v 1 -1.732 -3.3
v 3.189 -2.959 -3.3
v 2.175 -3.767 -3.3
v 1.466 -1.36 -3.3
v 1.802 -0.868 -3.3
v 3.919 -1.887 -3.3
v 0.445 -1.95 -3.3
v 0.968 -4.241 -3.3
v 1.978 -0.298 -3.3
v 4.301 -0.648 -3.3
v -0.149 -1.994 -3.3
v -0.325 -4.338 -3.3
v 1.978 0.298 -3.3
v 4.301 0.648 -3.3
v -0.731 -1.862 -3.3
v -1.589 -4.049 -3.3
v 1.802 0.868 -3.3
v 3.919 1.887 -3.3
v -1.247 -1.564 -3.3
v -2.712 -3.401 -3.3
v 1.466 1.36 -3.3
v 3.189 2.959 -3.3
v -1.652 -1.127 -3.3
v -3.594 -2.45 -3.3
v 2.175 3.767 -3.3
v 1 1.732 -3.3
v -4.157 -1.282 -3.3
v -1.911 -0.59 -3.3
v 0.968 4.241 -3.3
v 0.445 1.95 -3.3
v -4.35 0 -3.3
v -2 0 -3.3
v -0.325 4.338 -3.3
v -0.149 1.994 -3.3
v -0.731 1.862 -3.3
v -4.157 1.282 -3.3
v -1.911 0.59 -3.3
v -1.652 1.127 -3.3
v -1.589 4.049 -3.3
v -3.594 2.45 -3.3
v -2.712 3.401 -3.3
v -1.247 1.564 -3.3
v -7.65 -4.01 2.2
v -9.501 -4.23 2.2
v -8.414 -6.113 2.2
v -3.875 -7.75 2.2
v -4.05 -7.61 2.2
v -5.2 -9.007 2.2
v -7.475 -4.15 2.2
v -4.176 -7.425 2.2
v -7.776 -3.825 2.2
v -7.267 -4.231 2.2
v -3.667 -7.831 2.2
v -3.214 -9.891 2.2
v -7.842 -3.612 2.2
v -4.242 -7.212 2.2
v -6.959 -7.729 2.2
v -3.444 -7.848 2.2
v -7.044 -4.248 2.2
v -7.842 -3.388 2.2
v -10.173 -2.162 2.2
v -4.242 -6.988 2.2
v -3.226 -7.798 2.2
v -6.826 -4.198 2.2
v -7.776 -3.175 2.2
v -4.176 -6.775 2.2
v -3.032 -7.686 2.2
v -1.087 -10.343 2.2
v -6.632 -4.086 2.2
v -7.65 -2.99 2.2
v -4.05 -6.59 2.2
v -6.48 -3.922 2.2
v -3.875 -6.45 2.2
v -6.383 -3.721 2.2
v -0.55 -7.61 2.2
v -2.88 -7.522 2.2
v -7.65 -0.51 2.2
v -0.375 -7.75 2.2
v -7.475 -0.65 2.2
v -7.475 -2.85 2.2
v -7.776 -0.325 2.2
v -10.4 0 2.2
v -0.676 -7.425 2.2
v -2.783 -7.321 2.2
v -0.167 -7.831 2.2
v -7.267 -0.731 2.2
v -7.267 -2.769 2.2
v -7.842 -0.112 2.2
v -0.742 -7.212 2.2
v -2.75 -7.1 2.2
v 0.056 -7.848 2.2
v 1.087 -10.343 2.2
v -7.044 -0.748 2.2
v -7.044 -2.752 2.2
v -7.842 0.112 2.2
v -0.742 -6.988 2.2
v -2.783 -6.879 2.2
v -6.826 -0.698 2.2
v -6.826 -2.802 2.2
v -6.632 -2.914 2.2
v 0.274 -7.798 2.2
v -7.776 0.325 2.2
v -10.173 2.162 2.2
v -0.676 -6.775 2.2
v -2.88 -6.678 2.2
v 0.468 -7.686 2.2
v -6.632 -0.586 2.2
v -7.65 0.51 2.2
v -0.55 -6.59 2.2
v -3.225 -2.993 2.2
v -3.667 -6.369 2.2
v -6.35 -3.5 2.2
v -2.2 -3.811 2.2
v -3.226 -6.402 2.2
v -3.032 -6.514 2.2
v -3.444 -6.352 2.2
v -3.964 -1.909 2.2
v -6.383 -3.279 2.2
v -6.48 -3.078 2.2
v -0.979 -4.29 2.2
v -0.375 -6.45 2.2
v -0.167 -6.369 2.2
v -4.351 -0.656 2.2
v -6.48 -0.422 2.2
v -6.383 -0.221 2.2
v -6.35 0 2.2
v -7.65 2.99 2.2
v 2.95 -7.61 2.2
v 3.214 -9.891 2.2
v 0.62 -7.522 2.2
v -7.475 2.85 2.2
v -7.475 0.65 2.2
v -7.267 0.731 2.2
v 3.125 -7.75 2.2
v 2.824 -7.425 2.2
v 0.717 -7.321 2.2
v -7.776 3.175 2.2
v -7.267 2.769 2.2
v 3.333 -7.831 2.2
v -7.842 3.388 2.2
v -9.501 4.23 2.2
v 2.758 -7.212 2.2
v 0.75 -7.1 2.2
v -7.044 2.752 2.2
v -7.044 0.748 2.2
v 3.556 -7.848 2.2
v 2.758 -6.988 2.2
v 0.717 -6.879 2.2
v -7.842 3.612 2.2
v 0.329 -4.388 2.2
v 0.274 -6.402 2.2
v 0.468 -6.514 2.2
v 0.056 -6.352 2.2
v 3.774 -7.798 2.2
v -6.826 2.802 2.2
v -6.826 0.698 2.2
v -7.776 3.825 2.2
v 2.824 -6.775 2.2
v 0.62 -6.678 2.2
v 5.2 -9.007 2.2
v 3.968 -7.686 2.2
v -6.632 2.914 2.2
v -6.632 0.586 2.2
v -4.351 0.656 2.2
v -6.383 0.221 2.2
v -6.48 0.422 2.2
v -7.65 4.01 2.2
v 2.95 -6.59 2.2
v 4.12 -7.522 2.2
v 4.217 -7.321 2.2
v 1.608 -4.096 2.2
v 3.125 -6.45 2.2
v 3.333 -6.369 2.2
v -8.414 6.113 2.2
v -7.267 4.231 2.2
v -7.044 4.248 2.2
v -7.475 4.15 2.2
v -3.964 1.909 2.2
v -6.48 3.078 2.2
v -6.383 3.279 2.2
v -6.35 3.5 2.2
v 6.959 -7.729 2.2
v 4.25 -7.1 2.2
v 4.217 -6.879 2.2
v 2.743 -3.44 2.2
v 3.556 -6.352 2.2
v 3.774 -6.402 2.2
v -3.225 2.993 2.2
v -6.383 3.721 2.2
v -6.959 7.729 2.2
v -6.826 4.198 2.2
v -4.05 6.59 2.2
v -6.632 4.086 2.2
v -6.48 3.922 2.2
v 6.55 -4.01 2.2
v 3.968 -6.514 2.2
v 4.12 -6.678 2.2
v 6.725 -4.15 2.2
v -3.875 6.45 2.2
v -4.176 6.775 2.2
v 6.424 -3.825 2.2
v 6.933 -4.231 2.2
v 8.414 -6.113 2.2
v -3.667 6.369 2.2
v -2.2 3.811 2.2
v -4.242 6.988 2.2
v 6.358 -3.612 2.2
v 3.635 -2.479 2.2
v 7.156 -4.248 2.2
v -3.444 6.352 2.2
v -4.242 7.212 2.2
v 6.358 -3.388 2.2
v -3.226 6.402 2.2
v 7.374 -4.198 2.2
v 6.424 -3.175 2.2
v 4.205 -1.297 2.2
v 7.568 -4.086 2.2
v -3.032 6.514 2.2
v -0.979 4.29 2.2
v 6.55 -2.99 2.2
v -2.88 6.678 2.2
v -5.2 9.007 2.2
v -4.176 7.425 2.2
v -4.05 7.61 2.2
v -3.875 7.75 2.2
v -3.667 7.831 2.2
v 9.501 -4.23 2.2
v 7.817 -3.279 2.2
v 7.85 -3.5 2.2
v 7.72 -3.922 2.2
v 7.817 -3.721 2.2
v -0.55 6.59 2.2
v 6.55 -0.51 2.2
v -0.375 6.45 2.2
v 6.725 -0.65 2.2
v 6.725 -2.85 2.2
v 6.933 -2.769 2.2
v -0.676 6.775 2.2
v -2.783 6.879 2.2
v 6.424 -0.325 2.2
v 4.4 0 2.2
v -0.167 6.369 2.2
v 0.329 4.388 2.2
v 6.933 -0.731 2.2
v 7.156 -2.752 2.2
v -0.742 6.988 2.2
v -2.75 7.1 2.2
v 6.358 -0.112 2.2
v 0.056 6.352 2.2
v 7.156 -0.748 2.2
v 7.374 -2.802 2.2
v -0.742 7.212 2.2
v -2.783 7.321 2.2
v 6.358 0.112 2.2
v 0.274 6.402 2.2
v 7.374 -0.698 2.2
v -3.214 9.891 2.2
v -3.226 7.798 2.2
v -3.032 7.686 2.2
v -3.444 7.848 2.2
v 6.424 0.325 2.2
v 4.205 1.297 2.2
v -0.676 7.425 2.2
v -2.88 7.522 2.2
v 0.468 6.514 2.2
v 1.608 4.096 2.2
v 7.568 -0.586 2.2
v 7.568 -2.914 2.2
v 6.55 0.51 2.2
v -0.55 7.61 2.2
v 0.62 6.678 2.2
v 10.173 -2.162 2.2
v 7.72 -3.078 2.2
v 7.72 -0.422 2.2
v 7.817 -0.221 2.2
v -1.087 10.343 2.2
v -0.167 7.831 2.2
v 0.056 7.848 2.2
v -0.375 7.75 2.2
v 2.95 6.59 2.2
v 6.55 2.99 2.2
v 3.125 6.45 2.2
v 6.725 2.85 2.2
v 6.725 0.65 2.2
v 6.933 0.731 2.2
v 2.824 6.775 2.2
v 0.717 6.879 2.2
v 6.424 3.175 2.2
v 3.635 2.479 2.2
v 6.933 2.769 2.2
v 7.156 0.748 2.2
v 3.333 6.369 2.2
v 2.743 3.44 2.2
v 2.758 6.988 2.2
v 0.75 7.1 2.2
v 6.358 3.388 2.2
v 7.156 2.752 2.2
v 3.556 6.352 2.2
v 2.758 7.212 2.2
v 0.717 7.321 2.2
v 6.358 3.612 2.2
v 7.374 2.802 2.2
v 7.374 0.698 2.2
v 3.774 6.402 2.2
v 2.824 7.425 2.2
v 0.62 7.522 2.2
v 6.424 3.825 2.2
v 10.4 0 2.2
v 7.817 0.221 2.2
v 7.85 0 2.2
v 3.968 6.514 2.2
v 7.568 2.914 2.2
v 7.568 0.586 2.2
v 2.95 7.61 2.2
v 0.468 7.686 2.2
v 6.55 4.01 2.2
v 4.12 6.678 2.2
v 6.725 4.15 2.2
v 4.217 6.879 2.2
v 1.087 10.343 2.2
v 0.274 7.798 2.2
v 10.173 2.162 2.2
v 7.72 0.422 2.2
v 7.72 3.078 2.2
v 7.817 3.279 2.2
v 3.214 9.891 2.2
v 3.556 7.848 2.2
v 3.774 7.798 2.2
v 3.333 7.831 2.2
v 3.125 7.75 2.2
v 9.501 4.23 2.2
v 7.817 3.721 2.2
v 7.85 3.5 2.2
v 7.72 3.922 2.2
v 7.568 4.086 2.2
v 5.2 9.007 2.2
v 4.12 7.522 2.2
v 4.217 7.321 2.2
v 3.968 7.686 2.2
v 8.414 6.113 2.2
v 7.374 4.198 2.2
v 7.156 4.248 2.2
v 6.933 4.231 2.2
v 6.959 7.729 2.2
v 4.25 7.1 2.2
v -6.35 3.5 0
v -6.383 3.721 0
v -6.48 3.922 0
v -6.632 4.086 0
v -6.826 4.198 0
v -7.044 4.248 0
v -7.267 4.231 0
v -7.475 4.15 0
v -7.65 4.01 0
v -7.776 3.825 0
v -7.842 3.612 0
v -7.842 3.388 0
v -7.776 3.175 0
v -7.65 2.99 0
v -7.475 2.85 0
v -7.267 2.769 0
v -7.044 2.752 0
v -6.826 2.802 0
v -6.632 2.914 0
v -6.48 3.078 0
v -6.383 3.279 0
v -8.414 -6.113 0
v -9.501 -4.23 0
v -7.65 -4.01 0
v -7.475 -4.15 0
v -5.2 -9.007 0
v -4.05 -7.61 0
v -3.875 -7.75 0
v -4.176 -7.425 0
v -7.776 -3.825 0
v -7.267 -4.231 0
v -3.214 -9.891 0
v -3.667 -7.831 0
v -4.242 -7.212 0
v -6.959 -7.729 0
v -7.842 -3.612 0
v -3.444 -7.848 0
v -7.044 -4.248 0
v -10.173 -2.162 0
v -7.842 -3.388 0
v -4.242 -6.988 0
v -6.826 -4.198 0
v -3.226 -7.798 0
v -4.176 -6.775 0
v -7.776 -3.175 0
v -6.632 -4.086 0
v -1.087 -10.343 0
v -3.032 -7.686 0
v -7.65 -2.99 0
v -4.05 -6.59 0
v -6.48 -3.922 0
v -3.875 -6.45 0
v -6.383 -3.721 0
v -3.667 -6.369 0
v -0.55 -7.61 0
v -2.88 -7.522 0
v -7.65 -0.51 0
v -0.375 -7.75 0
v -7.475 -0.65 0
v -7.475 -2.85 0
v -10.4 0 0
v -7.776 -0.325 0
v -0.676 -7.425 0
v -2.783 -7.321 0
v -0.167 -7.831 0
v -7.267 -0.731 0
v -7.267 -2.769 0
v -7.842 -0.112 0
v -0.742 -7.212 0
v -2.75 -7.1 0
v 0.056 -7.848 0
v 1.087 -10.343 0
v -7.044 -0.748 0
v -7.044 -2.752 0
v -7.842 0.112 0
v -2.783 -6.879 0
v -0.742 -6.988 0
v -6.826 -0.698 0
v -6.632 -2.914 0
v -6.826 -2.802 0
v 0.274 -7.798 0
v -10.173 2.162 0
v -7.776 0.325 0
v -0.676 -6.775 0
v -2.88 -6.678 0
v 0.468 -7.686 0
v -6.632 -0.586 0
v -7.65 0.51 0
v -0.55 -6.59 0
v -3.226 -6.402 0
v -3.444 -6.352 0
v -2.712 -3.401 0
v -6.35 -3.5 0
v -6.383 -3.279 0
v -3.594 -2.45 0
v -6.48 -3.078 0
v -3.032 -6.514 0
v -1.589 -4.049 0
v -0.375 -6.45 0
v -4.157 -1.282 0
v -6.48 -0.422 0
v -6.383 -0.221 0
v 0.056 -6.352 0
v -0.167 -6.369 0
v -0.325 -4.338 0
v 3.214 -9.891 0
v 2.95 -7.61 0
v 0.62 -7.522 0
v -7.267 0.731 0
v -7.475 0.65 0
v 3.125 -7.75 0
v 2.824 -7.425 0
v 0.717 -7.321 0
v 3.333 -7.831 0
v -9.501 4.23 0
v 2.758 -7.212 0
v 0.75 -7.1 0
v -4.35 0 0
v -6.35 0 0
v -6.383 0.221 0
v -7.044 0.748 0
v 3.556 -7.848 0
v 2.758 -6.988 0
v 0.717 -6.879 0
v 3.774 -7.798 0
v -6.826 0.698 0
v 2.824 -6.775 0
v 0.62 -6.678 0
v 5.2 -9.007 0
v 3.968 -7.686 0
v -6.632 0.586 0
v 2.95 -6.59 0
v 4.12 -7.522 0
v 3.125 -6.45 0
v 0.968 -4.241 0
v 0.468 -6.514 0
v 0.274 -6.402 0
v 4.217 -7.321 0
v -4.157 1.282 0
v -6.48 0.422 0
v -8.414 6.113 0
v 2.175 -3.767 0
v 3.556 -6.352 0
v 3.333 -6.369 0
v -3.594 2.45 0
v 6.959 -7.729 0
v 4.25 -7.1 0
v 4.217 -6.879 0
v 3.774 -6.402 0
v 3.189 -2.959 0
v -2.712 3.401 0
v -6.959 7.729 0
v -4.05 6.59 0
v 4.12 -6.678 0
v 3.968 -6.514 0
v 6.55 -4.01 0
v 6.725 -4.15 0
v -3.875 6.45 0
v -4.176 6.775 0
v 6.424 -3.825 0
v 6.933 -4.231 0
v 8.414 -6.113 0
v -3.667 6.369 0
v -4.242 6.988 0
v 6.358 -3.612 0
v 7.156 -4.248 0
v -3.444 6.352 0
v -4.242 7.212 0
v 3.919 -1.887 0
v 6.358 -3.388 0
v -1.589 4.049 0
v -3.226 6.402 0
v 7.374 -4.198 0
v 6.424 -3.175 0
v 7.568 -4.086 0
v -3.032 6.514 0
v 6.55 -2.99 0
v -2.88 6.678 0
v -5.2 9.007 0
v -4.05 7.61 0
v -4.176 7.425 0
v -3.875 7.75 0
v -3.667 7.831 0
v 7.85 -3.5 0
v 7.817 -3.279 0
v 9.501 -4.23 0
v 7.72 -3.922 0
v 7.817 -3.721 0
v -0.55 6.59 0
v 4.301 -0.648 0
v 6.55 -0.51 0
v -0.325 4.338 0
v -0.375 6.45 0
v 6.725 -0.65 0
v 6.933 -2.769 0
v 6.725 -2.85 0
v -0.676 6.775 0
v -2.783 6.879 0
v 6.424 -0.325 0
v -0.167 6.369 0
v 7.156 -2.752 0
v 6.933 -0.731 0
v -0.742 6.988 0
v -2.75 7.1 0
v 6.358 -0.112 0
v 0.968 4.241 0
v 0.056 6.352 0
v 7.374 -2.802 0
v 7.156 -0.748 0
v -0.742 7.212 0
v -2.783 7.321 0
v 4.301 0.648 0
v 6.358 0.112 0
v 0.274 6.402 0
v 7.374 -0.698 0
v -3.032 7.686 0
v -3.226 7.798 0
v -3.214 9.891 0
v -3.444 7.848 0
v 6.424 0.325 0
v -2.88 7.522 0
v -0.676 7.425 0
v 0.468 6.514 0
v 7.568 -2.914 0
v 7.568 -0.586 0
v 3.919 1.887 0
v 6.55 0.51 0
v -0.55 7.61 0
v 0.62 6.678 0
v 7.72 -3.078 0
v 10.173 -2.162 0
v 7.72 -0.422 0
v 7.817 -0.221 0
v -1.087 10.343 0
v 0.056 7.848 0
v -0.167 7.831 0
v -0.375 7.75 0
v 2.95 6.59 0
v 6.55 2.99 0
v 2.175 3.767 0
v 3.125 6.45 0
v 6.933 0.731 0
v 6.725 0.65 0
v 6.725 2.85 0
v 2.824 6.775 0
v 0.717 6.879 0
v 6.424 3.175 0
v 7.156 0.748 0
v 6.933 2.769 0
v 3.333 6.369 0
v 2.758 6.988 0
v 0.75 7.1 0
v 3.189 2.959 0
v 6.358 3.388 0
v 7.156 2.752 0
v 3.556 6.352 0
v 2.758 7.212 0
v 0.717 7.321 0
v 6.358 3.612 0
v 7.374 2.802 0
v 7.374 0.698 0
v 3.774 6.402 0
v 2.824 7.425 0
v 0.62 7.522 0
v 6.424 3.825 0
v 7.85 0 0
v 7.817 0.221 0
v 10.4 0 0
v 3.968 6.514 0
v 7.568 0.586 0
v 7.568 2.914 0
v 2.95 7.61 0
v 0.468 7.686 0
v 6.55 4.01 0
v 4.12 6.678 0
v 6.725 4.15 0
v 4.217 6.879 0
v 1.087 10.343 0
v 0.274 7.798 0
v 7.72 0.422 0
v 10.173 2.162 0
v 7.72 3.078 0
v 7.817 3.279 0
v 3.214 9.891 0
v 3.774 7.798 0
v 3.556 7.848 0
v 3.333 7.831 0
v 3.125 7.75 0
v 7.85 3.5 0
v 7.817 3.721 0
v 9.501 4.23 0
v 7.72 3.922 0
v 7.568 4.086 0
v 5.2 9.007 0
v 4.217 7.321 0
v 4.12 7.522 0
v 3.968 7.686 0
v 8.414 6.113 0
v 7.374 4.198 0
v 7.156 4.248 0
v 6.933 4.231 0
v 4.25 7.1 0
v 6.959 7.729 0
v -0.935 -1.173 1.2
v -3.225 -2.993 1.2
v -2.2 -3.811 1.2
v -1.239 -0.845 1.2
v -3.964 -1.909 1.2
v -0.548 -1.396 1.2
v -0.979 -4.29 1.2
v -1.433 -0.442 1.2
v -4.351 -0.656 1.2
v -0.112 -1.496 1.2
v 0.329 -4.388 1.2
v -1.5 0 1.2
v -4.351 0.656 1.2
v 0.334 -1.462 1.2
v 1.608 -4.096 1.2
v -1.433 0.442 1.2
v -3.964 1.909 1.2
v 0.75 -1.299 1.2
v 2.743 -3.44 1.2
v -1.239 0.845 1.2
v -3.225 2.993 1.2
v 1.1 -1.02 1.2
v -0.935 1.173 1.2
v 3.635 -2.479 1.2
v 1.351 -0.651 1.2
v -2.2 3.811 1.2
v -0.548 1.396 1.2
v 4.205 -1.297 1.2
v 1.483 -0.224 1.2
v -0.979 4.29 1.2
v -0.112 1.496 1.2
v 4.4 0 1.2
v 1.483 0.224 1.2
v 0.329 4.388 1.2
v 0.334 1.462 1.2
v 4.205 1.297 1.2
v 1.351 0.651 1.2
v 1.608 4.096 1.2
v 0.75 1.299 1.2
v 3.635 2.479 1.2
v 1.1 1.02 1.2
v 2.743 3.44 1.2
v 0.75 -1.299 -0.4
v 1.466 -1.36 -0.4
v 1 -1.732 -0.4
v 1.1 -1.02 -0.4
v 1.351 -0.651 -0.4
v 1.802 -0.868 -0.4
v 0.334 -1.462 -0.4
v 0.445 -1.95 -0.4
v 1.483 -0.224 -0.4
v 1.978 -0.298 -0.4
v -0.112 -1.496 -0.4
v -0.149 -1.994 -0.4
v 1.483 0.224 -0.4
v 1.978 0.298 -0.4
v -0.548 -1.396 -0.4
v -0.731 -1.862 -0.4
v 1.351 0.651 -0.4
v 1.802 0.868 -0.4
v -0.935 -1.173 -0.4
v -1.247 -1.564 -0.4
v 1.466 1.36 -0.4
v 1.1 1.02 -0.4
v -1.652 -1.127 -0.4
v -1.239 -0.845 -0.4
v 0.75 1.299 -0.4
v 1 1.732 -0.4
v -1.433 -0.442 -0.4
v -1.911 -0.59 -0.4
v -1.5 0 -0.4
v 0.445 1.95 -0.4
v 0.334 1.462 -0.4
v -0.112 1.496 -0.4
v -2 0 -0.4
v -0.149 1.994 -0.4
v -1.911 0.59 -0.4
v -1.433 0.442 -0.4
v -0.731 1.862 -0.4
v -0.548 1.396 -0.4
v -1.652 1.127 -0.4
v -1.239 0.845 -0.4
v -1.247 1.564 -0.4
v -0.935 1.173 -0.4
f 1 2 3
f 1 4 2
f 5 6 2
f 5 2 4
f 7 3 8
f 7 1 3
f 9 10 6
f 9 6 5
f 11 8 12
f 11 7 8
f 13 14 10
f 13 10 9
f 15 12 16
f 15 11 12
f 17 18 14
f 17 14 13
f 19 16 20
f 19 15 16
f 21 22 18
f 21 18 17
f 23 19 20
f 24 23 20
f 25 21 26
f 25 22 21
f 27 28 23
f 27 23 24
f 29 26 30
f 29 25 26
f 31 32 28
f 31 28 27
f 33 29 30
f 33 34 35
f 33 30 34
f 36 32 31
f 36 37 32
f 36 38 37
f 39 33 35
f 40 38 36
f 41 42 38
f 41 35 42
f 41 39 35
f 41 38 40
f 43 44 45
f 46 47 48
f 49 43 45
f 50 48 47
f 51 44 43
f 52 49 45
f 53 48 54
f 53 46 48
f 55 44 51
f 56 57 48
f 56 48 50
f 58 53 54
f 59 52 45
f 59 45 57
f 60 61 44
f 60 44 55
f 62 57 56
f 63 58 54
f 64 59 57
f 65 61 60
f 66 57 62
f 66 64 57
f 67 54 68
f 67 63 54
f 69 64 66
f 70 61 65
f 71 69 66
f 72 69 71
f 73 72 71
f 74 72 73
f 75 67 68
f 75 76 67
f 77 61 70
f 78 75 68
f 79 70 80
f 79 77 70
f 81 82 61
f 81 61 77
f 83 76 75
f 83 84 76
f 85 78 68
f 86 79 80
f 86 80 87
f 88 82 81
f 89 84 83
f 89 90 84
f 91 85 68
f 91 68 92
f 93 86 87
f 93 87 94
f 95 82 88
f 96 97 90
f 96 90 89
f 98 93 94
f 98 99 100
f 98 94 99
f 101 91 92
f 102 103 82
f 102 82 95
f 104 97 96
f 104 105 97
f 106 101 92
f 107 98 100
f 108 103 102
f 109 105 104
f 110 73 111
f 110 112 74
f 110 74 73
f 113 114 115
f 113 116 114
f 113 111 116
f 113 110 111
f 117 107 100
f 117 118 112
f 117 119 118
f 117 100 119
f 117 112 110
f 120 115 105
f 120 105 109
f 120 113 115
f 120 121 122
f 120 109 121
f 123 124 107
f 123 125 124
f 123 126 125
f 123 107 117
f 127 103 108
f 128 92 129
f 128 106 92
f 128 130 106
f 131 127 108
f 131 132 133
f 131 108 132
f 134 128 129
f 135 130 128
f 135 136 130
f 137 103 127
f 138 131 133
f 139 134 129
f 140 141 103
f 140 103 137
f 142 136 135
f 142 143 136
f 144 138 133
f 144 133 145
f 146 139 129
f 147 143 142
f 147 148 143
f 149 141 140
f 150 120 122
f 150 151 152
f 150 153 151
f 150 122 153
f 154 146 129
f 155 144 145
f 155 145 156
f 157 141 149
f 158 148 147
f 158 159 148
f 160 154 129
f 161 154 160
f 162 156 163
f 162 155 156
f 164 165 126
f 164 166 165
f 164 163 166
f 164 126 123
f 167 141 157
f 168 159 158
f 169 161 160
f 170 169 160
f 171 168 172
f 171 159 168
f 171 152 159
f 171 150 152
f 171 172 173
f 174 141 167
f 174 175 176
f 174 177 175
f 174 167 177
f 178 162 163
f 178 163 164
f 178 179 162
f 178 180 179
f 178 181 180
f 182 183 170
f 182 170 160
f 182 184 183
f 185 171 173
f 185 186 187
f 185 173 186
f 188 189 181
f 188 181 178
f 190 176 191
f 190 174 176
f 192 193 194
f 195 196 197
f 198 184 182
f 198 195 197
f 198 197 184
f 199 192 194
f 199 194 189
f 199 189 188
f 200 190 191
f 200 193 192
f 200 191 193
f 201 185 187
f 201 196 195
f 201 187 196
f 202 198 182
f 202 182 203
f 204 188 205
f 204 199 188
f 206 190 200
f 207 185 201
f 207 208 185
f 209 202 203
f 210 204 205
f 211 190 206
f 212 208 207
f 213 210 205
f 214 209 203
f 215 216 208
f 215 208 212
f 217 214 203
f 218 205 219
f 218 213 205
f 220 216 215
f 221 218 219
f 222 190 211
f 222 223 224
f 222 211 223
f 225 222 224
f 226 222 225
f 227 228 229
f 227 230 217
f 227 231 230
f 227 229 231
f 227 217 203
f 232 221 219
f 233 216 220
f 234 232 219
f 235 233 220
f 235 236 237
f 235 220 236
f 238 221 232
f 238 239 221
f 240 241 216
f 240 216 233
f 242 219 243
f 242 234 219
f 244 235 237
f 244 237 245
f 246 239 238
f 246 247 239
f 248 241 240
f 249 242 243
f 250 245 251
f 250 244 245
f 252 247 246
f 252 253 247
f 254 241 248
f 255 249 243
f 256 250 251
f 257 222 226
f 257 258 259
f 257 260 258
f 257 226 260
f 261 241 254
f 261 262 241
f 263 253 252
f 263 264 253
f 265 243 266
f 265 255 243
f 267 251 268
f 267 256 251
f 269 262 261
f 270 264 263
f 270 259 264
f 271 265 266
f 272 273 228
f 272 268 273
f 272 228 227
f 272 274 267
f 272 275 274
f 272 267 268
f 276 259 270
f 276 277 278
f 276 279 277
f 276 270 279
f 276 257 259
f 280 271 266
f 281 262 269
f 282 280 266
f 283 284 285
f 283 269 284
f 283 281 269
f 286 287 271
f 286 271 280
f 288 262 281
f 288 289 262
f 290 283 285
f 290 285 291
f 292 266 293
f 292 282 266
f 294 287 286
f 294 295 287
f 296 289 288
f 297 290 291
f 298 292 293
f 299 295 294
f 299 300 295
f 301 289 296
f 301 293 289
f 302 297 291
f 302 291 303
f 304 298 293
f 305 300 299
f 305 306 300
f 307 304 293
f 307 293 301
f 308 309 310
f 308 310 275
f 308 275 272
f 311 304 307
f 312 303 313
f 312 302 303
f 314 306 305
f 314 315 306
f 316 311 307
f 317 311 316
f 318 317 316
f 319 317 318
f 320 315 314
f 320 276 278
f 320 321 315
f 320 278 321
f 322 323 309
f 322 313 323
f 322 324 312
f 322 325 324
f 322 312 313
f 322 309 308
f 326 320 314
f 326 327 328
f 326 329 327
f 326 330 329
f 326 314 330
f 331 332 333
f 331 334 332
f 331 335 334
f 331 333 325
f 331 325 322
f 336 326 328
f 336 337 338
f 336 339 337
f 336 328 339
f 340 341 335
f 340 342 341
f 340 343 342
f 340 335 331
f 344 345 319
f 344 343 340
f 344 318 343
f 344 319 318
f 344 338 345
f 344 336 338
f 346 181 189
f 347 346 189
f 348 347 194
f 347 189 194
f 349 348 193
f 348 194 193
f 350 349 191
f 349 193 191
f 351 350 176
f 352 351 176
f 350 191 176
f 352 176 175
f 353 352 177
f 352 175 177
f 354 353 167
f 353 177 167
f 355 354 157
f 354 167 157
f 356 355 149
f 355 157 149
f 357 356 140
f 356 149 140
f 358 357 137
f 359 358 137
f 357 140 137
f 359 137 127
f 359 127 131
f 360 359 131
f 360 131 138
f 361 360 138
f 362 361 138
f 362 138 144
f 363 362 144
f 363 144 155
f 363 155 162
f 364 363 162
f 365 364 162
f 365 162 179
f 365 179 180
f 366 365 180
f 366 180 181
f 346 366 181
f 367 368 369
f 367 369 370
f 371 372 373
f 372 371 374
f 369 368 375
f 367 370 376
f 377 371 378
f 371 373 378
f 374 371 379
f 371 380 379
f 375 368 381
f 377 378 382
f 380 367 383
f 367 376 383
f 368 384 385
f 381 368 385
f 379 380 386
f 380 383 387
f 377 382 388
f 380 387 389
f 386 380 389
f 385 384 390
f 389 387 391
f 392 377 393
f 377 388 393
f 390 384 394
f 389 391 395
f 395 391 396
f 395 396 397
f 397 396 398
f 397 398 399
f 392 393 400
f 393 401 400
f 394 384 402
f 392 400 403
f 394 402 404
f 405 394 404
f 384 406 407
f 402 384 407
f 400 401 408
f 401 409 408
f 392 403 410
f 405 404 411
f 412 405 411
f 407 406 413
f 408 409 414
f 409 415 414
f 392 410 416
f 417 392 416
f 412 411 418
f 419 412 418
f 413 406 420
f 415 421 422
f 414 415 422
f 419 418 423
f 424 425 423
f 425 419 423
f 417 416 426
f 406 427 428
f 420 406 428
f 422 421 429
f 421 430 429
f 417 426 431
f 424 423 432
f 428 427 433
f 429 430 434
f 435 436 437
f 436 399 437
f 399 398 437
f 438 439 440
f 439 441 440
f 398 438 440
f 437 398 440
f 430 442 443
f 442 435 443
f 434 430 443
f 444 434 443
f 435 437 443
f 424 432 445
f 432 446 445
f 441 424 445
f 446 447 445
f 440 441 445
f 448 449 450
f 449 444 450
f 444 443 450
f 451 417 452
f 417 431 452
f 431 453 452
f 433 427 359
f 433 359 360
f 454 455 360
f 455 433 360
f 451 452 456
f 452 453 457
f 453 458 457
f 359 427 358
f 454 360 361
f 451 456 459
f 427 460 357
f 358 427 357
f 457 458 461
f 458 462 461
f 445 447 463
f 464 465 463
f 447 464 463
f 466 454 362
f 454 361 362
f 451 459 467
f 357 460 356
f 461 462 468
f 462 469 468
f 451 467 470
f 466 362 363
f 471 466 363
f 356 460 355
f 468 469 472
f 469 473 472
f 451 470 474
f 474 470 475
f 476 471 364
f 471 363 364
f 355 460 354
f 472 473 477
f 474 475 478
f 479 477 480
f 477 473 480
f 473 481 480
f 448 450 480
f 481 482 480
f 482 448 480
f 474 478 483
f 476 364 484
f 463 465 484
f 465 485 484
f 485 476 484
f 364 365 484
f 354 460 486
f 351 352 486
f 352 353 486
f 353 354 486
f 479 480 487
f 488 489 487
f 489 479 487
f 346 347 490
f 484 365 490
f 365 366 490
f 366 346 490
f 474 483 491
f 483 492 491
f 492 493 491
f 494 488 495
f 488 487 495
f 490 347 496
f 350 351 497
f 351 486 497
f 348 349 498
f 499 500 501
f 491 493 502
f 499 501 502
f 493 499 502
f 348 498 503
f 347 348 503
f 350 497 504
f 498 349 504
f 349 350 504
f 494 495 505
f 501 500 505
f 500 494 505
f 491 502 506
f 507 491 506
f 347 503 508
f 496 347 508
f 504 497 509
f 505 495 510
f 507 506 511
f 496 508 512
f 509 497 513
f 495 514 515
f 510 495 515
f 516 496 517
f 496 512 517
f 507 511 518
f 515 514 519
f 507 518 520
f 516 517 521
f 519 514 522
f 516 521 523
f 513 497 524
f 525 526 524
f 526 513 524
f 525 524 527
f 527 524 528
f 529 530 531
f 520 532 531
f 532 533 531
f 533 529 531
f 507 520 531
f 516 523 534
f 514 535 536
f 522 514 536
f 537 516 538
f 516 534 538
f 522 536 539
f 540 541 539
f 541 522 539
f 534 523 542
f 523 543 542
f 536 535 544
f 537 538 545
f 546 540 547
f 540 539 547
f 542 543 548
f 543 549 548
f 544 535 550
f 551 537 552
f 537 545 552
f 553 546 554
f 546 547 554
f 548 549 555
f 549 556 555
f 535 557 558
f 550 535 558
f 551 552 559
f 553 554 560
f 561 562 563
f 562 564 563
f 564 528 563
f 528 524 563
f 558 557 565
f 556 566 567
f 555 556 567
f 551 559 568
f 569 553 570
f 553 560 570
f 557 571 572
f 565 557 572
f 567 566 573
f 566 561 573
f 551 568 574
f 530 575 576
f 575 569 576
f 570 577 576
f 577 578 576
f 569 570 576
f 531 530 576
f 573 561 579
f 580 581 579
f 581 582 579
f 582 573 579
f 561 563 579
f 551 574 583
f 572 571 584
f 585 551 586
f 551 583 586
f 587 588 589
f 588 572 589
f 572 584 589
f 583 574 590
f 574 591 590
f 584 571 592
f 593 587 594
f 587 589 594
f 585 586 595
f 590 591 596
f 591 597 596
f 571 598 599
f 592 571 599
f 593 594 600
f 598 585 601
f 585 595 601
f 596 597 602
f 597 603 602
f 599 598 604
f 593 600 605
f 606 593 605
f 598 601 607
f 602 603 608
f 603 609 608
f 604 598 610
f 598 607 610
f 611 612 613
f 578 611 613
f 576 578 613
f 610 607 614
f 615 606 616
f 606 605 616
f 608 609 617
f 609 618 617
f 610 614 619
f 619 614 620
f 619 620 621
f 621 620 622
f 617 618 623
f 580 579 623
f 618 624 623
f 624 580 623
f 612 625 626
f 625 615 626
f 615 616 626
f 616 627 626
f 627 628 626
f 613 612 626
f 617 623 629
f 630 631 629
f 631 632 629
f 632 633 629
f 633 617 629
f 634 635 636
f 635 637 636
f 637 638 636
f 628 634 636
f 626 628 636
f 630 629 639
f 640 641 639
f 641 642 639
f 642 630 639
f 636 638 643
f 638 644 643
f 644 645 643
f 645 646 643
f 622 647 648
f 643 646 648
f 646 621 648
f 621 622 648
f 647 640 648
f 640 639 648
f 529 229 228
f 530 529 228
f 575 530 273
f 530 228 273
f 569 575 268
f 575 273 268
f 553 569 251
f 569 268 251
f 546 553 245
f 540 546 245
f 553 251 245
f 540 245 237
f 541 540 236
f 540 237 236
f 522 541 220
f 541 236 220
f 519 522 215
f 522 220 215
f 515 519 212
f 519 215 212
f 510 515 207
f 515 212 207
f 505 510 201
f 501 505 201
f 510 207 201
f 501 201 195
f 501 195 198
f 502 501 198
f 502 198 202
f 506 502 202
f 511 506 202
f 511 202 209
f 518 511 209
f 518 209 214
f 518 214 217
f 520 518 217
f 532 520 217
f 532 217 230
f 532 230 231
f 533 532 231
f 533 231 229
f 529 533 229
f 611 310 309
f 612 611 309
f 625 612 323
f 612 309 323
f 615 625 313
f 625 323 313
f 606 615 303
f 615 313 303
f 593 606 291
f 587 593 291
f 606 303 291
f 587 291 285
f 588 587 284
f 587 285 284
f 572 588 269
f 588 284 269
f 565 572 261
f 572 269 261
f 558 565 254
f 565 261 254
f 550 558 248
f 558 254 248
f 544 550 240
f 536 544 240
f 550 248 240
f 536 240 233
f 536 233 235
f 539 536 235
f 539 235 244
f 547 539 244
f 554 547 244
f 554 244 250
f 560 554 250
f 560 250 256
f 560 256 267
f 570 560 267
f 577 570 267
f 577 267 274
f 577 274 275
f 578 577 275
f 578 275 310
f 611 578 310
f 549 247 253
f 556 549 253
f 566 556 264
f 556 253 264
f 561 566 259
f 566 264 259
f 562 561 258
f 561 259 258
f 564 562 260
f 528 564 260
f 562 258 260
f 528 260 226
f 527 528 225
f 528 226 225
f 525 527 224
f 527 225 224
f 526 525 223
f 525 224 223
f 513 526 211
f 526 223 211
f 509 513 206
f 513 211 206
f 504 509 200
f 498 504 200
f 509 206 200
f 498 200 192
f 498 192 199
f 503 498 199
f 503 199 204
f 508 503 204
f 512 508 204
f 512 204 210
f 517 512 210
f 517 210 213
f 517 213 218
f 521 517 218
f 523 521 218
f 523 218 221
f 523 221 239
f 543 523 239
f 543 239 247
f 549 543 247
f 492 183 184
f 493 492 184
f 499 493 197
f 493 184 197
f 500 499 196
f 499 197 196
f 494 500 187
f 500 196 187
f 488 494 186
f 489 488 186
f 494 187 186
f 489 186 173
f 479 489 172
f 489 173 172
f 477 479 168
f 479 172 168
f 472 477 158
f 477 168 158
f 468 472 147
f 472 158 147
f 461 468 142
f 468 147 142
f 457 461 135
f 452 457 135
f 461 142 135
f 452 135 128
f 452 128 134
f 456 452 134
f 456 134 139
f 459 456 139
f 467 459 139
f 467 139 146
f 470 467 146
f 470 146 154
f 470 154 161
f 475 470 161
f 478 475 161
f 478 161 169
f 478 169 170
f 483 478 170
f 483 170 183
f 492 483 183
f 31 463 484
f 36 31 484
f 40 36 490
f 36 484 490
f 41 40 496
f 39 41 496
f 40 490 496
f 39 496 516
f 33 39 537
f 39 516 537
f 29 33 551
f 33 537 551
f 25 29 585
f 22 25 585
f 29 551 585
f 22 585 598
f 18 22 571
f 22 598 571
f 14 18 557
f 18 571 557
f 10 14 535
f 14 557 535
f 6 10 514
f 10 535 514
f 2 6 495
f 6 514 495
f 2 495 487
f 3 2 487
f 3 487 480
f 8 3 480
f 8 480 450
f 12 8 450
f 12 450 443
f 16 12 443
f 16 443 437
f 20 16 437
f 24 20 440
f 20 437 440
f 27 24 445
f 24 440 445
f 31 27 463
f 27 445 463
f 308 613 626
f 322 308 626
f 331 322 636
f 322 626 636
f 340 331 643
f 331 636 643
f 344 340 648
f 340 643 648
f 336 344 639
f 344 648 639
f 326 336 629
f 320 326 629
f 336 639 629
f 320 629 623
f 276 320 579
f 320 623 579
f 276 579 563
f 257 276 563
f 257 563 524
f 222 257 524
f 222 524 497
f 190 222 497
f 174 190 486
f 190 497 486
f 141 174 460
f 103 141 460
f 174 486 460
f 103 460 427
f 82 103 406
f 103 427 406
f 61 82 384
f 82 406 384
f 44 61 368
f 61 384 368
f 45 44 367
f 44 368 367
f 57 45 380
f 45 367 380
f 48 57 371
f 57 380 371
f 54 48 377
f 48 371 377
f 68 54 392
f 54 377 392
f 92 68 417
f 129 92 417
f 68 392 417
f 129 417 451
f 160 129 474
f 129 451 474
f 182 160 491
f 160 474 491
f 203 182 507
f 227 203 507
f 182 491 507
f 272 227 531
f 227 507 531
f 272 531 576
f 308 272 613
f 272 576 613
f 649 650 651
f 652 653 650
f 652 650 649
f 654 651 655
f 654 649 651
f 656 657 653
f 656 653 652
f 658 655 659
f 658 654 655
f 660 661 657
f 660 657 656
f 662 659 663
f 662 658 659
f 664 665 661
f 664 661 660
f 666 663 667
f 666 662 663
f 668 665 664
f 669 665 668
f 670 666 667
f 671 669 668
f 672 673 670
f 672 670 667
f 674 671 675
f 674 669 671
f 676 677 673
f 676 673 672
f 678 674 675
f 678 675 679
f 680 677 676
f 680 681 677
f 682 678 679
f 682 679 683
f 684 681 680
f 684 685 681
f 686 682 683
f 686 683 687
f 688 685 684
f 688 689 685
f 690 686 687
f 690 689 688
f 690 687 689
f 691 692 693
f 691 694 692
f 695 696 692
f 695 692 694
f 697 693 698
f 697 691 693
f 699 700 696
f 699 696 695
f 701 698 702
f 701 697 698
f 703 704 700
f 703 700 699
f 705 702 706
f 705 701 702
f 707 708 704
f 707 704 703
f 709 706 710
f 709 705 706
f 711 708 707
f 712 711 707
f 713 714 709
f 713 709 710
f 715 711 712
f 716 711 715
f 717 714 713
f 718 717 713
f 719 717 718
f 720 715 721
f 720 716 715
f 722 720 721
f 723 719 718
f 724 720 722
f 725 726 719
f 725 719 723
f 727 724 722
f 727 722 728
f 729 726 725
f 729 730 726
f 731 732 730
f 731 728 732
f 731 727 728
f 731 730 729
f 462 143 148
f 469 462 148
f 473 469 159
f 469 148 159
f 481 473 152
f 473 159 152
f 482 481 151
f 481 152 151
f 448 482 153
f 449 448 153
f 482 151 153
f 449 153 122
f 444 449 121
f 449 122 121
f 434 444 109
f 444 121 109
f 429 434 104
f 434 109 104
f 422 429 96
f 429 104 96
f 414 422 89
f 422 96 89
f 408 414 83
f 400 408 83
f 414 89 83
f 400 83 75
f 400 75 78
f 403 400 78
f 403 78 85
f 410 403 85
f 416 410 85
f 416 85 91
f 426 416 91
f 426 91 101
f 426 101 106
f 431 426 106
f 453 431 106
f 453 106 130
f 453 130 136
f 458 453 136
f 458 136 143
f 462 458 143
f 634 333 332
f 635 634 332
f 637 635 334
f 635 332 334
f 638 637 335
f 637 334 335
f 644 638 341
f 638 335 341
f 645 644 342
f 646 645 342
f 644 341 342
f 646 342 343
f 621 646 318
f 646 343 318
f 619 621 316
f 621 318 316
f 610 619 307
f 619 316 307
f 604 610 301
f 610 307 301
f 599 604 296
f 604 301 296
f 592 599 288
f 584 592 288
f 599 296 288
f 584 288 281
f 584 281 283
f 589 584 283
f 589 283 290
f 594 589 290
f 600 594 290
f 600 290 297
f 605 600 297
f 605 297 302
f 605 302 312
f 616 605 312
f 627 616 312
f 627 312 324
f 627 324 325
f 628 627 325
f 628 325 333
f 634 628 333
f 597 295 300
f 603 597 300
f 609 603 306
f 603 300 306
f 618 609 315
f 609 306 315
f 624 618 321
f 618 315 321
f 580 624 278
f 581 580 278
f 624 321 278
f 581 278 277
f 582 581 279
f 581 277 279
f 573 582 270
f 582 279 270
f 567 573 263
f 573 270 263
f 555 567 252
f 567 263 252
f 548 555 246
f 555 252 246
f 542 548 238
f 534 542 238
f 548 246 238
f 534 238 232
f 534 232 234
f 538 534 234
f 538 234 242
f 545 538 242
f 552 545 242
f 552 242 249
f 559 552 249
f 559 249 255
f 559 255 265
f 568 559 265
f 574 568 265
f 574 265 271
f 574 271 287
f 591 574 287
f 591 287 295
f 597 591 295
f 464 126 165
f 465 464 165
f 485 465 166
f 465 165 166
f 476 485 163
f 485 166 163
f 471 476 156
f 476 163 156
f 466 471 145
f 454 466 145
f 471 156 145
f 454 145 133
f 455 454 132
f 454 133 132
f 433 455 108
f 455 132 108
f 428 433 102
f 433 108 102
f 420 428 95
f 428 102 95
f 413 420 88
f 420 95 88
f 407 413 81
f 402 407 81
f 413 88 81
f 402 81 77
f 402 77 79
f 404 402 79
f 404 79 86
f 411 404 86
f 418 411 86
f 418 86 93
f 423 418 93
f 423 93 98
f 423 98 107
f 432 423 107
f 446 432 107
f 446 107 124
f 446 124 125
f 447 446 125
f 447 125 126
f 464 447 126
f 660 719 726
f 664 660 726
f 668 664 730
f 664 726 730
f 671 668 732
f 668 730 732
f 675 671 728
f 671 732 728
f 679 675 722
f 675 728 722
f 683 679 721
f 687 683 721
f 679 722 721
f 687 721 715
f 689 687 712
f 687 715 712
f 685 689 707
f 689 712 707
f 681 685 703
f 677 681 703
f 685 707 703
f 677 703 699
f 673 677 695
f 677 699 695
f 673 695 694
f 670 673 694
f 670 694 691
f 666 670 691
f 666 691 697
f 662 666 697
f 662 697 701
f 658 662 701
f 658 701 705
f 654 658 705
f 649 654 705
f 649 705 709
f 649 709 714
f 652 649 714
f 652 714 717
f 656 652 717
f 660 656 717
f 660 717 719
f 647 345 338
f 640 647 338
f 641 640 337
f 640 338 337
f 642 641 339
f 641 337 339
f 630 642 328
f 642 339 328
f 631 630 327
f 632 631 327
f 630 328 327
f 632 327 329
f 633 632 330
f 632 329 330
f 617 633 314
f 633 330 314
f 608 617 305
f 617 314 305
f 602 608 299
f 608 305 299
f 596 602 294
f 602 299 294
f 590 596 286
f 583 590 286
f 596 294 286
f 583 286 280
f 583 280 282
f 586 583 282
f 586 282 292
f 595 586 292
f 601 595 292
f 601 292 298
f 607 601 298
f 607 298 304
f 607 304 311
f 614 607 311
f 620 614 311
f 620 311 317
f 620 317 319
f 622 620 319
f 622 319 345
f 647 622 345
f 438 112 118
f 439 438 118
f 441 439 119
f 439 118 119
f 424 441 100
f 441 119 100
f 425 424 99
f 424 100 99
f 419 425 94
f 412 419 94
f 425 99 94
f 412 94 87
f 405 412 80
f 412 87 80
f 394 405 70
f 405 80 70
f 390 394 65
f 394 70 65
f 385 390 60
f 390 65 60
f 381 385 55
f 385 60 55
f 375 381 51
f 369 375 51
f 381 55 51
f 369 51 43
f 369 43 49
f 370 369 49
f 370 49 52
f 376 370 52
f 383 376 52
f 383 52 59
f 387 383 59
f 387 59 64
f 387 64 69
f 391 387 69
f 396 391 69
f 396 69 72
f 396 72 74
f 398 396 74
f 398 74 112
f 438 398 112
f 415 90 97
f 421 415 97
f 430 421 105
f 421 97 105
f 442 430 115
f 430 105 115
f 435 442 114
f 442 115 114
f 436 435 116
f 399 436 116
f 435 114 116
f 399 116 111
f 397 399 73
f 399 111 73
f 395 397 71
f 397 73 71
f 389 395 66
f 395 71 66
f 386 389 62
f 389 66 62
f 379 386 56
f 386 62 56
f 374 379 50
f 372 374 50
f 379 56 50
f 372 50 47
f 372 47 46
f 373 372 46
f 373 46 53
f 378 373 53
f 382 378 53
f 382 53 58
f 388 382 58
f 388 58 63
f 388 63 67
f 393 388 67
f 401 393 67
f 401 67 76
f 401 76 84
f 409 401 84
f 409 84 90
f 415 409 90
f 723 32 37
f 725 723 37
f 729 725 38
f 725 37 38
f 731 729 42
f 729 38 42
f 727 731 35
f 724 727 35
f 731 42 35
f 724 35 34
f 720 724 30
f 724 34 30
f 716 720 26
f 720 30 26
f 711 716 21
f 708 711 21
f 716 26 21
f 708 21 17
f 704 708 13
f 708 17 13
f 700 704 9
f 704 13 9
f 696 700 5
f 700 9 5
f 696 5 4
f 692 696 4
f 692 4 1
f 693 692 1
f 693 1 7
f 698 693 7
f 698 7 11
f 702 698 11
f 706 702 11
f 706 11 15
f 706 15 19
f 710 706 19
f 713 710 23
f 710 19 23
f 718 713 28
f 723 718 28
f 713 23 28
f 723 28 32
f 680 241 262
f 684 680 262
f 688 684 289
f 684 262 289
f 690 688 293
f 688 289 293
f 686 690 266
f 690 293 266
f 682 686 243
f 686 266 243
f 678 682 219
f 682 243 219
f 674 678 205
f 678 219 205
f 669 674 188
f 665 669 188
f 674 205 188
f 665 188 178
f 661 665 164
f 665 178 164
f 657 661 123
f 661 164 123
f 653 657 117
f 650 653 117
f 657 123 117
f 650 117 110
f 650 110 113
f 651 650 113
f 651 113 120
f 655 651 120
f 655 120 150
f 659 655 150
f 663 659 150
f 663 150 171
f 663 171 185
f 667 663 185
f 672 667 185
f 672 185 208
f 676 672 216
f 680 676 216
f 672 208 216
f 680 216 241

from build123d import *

# Parameters (mm, degrees)
SKETCH_1_R          = 10.4
EXTRUDE_1_DEPTH     = 2.2
SKETCH_2_R          = 4.35
EXTRUDE_2_DEPTH     = 3.3
CUT_EXTRUDE_START   = 3.3
SKETCH_3_R          = 1.5
CUT_EXTRUDE_1_DEPTH = 19.373486657
SKETCH_4_R          = 4.4
CUT_EXTRUDE_2_DEPTH = 1
SKETCH_5_R          = 0.75
CUT_EXTRUDE_3_DEPTH = 16.702547564
SKETCH_6_R          = 2
CUT_EXTRUDE_4_DEPTH = 2.9


with BuildPart() as part:
    # 草图1 → 凸台-拉伸1 (new body)
    with BuildSketch(Plane.XY):
        Circle(SKETCH_1_R)
    extrude(amount=EXTRUDE_1_DEPTH)

    # 草图2 → 凸台-拉伸2 (add)
    with BuildSketch(Plane(origin=(0, 0, 0), x_dir=(-1, 0, 0), z_dir=(0, 0, -1))):
        Circle(SKETCH_2_R)
    extrude(amount=EXTRUDE_2_DEPTH)

    # 草图3 → 切除-拉伸1 (cut, through all)
    with BuildSketch(Plane(origin=(0, 0, 0), x_dir=(-1, 0, 0), z_dir=(0, 0, -1)).offset(CUT_EXTRUDE_START)):
        Circle(SKETCH_3_R)
    extrude(amount=-CUT_EXTRUDE_1_DEPTH, mode=Mode.SUBTRACT)

    # 草图4 → 切除-拉伸2 (cut)
    with BuildSketch(Plane.XY.offset(2.2)):
        Circle(SKETCH_4_R)
    extrude(amount=-CUT_EXTRUDE_2_DEPTH, mode=Mode.SUBTRACT)

    # 草图5 → 切除-拉伸3 (cut, through all)
    with BuildSketch(Plane.XY.offset(2.2)):
        with Locations((0, 7.1)):
            Circle(SKETCH_5_R)
        with Locations((3.5, 7.1)):
            Circle(SKETCH_5_R)
        with Locations((-3.5, 7.1)):
            Circle(SKETCH_5_R)
        with Locations((7.1, 3.5)):
            Circle(SKETCH_5_R)
        with Locations((7.1, 0)):
            Circle(SKETCH_5_R)
        with Locations((7.1, -3.5)):
            Circle(SKETCH_5_R)
        with Locations((3.5, -7.1)):
            Circle(SKETCH_5_R)
        with Locations((0, -7.1)):
            Circle(SKETCH_5_R)
        with Locations((-3.5, -7.1)):
            Circle(SKETCH_5_R)
        with Locations((-7.1, -3.5)):
            Circle(SKETCH_5_R)
        with Locations((-7.1, 0)):
            Circle(SKETCH_5_R)
        with Locations((-7.1, 3.5)):
            Circle(SKETCH_5_R)
    extrude(amount=-CUT_EXTRUDE_3_DEPTH, mode=Mode.SUBTRACT)

    # 草图6 → 切除-拉伸4 (cut)
    with BuildSketch(Plane(origin=(0, 0, -3.3), x_dir=(-1, 0, 0), z_dir=(0, 0, -1))):
        Circle(SKETCH_6_R)
    extrude(amount=-CUT_EXTRUDE_4_DEPTH, mode=Mode.SUBTRACT)


solid = part.part
